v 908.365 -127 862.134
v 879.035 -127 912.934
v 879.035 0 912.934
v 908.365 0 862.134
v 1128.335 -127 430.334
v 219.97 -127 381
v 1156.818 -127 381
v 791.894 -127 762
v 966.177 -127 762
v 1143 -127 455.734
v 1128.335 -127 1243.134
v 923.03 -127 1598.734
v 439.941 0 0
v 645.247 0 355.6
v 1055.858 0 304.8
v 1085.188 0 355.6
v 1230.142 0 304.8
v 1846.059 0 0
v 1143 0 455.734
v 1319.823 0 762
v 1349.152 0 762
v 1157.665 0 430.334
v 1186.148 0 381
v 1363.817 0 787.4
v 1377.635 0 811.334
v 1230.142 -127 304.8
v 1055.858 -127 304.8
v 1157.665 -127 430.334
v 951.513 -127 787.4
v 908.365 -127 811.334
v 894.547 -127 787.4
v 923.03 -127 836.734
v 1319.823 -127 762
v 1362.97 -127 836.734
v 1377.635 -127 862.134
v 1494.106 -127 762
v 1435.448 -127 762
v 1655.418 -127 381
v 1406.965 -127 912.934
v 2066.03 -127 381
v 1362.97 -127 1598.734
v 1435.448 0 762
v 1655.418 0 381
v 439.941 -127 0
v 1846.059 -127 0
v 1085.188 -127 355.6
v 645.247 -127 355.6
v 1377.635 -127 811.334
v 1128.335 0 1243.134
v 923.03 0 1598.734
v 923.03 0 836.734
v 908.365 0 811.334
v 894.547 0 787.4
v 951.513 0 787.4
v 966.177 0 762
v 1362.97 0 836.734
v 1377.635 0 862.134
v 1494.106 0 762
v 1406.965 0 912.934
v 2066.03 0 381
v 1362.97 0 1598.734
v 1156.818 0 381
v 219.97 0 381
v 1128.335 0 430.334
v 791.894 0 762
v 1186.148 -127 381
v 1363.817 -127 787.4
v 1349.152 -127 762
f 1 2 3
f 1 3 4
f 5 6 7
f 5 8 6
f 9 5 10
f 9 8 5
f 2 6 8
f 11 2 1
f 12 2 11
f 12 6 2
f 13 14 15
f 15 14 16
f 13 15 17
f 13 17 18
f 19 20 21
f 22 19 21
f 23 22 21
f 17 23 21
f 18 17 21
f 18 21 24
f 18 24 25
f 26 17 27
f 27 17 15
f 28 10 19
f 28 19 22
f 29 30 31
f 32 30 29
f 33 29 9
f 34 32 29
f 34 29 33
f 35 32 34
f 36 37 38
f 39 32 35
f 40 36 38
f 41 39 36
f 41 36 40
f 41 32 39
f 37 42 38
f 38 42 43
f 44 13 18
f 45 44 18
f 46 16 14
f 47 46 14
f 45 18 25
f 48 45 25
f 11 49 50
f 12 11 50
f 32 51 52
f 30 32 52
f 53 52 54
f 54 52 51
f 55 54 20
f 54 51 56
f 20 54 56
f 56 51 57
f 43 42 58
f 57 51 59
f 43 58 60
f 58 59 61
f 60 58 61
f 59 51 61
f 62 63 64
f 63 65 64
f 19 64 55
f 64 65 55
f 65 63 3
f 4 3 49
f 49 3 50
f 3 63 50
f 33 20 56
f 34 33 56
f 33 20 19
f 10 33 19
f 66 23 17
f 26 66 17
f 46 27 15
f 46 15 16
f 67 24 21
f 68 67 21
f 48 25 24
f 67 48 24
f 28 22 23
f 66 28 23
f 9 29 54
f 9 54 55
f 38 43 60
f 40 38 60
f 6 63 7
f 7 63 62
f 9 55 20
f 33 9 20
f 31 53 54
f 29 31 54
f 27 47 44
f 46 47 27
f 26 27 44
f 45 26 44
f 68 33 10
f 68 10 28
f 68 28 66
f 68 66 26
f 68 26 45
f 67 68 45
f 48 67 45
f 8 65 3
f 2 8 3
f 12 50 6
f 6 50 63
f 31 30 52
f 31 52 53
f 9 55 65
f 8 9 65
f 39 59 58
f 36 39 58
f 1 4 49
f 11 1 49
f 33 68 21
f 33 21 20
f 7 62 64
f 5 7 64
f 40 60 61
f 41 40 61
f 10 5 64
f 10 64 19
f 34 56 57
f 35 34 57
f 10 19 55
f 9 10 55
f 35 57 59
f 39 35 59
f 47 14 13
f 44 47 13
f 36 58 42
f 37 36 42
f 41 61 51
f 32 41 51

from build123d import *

# Parameters (mm, degrees)
F1_DEPTH = 127


with BuildPart() as f1:
    # F0 (on Front) → F1 (new body)
    with BuildSketch(Plane.XZ):
        Polygon((615.9172671715, 304.8), (439.9409051225, 0), (879.881810245, 0), (1055.858172294, 304.8), align=None)
        Polygon((645.2466608463, 355.6), (615.9172671715, 304.8), (1055.858172294, 304.8), (1085.1875659688, 355.6), align=None)
        Polygon((1055.858172294, 304.8), (879.881810245, 0), (909.2112039198, 0), (1085.1875659688, 304.8), align=None)
        Polygon((1200.8124340312, 304.8), (1376.7887960802, 0), (1406.118189755, 0), (1230.141827706, 304.8), align=None)
        Polygon((1085.1875659688, 304.8), (909.2112039198, 0), (1376.7887960802, 0), (1200.8124340312, 304.8), align=None)
        Polygon((1230.141827706, 304.8), (1406.118189755, 0), (1846.0590948775, 0), (1670.0827328285, 304.8), align=None)
        Polygon((1200.8124340312, 355.6), (1230.141827706, 304.8), (1670.0827328285, 304.8), (1640.7533391537, 355.6), align=None)
        Polygon((1186.1477371938, 381), (1200.8124340312, 355.6), (1640.7533391537, 355.6), (1626.0886423163, 381), align=None)
        Polygon((1157.6646968374, 430.3340730512), (1186.1477371938, 381), (1626.0886423163, 381), (1406.118189755, 762), (1349.1521090423, 762), align=None)
        Polygon((1363.8168058797, 787.4), (1349.1521090423, 762), (1406.118189755, 762), (1391.4534929176, 787.4), align=None)
        Polygon((1377.6351493987, 811.3340730512), (1363.8168058797, 787.4), (1391.4534929176, 787.4), align=None)
        Polygon((1319.8227153675, 762), (1143, 455.7340730512), (1157.6646968374, 430.3340730512), (1349.1521090423, 762), align=None)
    extrude(amount=F1_DEPTH)


with BuildPart() as f1b:
    # F0 (on Front) → F1, piece 2 (new body)
    with BuildSketch(Plane.XZ):
        Polygon((1494.1063707795, 762), (1714.0768233408, 381), (2066.0295474388, 381), (1846.0590948775, 762), align=None)
        Polygon((1435.4475834298, 762), (1655.4180359911, 381), (1714.0768233408, 381), (1494.1063707795, 762), align=None)
        Polygon((1479.4416739421, 787.4), (1494.1063707795, 762), (1846.0590948775, 762), (1831.3943980401, 787.4), align=None)
        Polygon((1421.6292399109, 887.5340730512), (1479.4416739421, 787.4), (1831.3943980401, 787.4), (1597.6056019599, 1192.3340730512), align=None)
        Polygon((1582.9409051225, 1217.7340730512), (1406.9645430735, 912.9340730512), (1421.6292399109, 887.5340730512), (1597.6056019599, 1192.3340730512), align=None)
        Polygon((1362.9704525612, 1598.7340730512), (1186.9940905122, 1293.9340730512), (1406.9645430735, 912.9340730512), (1582.9409051225, 1217.7340730512), align=None)
        Polygon((1186.9940905122, 1293.9340730512), (1157.6646968374, 1243.1340730512), (1377.6351493987, 862.1340730512), (1406.9645430735, 912.9340730512), align=None)
        Polygon((1157.6646968374, 1243.1340730512), (1143, 1217.7340730512), (1362.9704525612, 836.7340730512), (1377.6351493987, 862.1340730512), align=None)
        Polygon((923.0295474388, 836.7340730512), (951.5125877951, 787.4), (1334.4874122049, 787.4), (1362.9704525612, 836.7340730512), (1143, 1217.7340730512), align=None)
        Polygon((908.3648506013, 811.3340730512), (922.1831941203, 787.4), (951.5125877951, 787.4), (923.0295474388, 836.7340730512), align=None)
        Polygon((908.3648506013, 811.3340730512), (894.5465070824, 787.4), (922.1831941203, 787.4), align=None)
        Polygon((951.5125877951, 787.4), (966.1772846325, 762), (1319.8227153675, 762), (1334.4874122049, 787.4), align=None)
    extrude(amount=F1_DEPTH)


with BuildPart() as f1c:
    # F0 (on Front) → F1, piece 3 (new body)
    with BuildSketch(Plane.XZ):
        Polygon((879.881810245, 762), (659.9113576837, 381), (1099.8522628062, 381), (1128.3353031626, 430.3340730512), (936.8478909577, 762), align=None)
        Polygon((850.5524165702, 762), (630.5819640089, 381), (659.9113576837, 381), (879.881810245, 762), align=None)
        Polygon((791.8936292205, 762), (571.9231766592, 381), (630.5819640089, 381), (850.5524165702, 762), align=None)
        Polygon((439.9409051225, 762), (219.9704525612, 381), (571.9231766592, 381), (791.8936292205, 762), align=None)
        Polygon((454.6056019599, 787.4), (439.9409051225, 762), (791.8936292205, 762), (806.5583260579, 787.4), align=None)
        Polygon((688.3943980401, 1192.3340730512), (454.6056019599, 787.4), (806.5583260579, 787.4), (864.3707600891, 887.5340730512), align=None)
        Polygon((703.0590948775, 1217.7340730512), (688.3943980401, 1192.3340730512), (864.3707600891, 887.5340730512), (879.0354569265, 912.9340730512), align=None)
        Polygon((923.0295474388, 1598.7340730512), (703.0590948775, 1217.7340730512), (879.0354569265, 912.9340730512), (1099.0059094878, 1293.9340730512), align=None)
        Polygon((1099.0059094878, 1293.9340730512), (879.0354569265, 912.9340730512), (908.3648506013, 862.1340730512), (1128.3353031626, 1243.1340730512), align=None)
        Polygon((1128.3353031626, 430.3340730512), (1099.8522628062, 381), (1129.1816564811, 381), (1143, 404.9340730512), align=None)
        Polygon((1143, 404.9340730512), (1129.1816564811, 381), (1156.8183435189, 381), align=None)
        Polygon((936.8478909577, 762), (1128.3353031626, 430.3340730512), (1143, 455.7340730512), (966.1772846325, 762), align=None)
    extrude(amount=F1_DEPTH)


solid = Compound([f1.part, f1b.part, f1c.part])
